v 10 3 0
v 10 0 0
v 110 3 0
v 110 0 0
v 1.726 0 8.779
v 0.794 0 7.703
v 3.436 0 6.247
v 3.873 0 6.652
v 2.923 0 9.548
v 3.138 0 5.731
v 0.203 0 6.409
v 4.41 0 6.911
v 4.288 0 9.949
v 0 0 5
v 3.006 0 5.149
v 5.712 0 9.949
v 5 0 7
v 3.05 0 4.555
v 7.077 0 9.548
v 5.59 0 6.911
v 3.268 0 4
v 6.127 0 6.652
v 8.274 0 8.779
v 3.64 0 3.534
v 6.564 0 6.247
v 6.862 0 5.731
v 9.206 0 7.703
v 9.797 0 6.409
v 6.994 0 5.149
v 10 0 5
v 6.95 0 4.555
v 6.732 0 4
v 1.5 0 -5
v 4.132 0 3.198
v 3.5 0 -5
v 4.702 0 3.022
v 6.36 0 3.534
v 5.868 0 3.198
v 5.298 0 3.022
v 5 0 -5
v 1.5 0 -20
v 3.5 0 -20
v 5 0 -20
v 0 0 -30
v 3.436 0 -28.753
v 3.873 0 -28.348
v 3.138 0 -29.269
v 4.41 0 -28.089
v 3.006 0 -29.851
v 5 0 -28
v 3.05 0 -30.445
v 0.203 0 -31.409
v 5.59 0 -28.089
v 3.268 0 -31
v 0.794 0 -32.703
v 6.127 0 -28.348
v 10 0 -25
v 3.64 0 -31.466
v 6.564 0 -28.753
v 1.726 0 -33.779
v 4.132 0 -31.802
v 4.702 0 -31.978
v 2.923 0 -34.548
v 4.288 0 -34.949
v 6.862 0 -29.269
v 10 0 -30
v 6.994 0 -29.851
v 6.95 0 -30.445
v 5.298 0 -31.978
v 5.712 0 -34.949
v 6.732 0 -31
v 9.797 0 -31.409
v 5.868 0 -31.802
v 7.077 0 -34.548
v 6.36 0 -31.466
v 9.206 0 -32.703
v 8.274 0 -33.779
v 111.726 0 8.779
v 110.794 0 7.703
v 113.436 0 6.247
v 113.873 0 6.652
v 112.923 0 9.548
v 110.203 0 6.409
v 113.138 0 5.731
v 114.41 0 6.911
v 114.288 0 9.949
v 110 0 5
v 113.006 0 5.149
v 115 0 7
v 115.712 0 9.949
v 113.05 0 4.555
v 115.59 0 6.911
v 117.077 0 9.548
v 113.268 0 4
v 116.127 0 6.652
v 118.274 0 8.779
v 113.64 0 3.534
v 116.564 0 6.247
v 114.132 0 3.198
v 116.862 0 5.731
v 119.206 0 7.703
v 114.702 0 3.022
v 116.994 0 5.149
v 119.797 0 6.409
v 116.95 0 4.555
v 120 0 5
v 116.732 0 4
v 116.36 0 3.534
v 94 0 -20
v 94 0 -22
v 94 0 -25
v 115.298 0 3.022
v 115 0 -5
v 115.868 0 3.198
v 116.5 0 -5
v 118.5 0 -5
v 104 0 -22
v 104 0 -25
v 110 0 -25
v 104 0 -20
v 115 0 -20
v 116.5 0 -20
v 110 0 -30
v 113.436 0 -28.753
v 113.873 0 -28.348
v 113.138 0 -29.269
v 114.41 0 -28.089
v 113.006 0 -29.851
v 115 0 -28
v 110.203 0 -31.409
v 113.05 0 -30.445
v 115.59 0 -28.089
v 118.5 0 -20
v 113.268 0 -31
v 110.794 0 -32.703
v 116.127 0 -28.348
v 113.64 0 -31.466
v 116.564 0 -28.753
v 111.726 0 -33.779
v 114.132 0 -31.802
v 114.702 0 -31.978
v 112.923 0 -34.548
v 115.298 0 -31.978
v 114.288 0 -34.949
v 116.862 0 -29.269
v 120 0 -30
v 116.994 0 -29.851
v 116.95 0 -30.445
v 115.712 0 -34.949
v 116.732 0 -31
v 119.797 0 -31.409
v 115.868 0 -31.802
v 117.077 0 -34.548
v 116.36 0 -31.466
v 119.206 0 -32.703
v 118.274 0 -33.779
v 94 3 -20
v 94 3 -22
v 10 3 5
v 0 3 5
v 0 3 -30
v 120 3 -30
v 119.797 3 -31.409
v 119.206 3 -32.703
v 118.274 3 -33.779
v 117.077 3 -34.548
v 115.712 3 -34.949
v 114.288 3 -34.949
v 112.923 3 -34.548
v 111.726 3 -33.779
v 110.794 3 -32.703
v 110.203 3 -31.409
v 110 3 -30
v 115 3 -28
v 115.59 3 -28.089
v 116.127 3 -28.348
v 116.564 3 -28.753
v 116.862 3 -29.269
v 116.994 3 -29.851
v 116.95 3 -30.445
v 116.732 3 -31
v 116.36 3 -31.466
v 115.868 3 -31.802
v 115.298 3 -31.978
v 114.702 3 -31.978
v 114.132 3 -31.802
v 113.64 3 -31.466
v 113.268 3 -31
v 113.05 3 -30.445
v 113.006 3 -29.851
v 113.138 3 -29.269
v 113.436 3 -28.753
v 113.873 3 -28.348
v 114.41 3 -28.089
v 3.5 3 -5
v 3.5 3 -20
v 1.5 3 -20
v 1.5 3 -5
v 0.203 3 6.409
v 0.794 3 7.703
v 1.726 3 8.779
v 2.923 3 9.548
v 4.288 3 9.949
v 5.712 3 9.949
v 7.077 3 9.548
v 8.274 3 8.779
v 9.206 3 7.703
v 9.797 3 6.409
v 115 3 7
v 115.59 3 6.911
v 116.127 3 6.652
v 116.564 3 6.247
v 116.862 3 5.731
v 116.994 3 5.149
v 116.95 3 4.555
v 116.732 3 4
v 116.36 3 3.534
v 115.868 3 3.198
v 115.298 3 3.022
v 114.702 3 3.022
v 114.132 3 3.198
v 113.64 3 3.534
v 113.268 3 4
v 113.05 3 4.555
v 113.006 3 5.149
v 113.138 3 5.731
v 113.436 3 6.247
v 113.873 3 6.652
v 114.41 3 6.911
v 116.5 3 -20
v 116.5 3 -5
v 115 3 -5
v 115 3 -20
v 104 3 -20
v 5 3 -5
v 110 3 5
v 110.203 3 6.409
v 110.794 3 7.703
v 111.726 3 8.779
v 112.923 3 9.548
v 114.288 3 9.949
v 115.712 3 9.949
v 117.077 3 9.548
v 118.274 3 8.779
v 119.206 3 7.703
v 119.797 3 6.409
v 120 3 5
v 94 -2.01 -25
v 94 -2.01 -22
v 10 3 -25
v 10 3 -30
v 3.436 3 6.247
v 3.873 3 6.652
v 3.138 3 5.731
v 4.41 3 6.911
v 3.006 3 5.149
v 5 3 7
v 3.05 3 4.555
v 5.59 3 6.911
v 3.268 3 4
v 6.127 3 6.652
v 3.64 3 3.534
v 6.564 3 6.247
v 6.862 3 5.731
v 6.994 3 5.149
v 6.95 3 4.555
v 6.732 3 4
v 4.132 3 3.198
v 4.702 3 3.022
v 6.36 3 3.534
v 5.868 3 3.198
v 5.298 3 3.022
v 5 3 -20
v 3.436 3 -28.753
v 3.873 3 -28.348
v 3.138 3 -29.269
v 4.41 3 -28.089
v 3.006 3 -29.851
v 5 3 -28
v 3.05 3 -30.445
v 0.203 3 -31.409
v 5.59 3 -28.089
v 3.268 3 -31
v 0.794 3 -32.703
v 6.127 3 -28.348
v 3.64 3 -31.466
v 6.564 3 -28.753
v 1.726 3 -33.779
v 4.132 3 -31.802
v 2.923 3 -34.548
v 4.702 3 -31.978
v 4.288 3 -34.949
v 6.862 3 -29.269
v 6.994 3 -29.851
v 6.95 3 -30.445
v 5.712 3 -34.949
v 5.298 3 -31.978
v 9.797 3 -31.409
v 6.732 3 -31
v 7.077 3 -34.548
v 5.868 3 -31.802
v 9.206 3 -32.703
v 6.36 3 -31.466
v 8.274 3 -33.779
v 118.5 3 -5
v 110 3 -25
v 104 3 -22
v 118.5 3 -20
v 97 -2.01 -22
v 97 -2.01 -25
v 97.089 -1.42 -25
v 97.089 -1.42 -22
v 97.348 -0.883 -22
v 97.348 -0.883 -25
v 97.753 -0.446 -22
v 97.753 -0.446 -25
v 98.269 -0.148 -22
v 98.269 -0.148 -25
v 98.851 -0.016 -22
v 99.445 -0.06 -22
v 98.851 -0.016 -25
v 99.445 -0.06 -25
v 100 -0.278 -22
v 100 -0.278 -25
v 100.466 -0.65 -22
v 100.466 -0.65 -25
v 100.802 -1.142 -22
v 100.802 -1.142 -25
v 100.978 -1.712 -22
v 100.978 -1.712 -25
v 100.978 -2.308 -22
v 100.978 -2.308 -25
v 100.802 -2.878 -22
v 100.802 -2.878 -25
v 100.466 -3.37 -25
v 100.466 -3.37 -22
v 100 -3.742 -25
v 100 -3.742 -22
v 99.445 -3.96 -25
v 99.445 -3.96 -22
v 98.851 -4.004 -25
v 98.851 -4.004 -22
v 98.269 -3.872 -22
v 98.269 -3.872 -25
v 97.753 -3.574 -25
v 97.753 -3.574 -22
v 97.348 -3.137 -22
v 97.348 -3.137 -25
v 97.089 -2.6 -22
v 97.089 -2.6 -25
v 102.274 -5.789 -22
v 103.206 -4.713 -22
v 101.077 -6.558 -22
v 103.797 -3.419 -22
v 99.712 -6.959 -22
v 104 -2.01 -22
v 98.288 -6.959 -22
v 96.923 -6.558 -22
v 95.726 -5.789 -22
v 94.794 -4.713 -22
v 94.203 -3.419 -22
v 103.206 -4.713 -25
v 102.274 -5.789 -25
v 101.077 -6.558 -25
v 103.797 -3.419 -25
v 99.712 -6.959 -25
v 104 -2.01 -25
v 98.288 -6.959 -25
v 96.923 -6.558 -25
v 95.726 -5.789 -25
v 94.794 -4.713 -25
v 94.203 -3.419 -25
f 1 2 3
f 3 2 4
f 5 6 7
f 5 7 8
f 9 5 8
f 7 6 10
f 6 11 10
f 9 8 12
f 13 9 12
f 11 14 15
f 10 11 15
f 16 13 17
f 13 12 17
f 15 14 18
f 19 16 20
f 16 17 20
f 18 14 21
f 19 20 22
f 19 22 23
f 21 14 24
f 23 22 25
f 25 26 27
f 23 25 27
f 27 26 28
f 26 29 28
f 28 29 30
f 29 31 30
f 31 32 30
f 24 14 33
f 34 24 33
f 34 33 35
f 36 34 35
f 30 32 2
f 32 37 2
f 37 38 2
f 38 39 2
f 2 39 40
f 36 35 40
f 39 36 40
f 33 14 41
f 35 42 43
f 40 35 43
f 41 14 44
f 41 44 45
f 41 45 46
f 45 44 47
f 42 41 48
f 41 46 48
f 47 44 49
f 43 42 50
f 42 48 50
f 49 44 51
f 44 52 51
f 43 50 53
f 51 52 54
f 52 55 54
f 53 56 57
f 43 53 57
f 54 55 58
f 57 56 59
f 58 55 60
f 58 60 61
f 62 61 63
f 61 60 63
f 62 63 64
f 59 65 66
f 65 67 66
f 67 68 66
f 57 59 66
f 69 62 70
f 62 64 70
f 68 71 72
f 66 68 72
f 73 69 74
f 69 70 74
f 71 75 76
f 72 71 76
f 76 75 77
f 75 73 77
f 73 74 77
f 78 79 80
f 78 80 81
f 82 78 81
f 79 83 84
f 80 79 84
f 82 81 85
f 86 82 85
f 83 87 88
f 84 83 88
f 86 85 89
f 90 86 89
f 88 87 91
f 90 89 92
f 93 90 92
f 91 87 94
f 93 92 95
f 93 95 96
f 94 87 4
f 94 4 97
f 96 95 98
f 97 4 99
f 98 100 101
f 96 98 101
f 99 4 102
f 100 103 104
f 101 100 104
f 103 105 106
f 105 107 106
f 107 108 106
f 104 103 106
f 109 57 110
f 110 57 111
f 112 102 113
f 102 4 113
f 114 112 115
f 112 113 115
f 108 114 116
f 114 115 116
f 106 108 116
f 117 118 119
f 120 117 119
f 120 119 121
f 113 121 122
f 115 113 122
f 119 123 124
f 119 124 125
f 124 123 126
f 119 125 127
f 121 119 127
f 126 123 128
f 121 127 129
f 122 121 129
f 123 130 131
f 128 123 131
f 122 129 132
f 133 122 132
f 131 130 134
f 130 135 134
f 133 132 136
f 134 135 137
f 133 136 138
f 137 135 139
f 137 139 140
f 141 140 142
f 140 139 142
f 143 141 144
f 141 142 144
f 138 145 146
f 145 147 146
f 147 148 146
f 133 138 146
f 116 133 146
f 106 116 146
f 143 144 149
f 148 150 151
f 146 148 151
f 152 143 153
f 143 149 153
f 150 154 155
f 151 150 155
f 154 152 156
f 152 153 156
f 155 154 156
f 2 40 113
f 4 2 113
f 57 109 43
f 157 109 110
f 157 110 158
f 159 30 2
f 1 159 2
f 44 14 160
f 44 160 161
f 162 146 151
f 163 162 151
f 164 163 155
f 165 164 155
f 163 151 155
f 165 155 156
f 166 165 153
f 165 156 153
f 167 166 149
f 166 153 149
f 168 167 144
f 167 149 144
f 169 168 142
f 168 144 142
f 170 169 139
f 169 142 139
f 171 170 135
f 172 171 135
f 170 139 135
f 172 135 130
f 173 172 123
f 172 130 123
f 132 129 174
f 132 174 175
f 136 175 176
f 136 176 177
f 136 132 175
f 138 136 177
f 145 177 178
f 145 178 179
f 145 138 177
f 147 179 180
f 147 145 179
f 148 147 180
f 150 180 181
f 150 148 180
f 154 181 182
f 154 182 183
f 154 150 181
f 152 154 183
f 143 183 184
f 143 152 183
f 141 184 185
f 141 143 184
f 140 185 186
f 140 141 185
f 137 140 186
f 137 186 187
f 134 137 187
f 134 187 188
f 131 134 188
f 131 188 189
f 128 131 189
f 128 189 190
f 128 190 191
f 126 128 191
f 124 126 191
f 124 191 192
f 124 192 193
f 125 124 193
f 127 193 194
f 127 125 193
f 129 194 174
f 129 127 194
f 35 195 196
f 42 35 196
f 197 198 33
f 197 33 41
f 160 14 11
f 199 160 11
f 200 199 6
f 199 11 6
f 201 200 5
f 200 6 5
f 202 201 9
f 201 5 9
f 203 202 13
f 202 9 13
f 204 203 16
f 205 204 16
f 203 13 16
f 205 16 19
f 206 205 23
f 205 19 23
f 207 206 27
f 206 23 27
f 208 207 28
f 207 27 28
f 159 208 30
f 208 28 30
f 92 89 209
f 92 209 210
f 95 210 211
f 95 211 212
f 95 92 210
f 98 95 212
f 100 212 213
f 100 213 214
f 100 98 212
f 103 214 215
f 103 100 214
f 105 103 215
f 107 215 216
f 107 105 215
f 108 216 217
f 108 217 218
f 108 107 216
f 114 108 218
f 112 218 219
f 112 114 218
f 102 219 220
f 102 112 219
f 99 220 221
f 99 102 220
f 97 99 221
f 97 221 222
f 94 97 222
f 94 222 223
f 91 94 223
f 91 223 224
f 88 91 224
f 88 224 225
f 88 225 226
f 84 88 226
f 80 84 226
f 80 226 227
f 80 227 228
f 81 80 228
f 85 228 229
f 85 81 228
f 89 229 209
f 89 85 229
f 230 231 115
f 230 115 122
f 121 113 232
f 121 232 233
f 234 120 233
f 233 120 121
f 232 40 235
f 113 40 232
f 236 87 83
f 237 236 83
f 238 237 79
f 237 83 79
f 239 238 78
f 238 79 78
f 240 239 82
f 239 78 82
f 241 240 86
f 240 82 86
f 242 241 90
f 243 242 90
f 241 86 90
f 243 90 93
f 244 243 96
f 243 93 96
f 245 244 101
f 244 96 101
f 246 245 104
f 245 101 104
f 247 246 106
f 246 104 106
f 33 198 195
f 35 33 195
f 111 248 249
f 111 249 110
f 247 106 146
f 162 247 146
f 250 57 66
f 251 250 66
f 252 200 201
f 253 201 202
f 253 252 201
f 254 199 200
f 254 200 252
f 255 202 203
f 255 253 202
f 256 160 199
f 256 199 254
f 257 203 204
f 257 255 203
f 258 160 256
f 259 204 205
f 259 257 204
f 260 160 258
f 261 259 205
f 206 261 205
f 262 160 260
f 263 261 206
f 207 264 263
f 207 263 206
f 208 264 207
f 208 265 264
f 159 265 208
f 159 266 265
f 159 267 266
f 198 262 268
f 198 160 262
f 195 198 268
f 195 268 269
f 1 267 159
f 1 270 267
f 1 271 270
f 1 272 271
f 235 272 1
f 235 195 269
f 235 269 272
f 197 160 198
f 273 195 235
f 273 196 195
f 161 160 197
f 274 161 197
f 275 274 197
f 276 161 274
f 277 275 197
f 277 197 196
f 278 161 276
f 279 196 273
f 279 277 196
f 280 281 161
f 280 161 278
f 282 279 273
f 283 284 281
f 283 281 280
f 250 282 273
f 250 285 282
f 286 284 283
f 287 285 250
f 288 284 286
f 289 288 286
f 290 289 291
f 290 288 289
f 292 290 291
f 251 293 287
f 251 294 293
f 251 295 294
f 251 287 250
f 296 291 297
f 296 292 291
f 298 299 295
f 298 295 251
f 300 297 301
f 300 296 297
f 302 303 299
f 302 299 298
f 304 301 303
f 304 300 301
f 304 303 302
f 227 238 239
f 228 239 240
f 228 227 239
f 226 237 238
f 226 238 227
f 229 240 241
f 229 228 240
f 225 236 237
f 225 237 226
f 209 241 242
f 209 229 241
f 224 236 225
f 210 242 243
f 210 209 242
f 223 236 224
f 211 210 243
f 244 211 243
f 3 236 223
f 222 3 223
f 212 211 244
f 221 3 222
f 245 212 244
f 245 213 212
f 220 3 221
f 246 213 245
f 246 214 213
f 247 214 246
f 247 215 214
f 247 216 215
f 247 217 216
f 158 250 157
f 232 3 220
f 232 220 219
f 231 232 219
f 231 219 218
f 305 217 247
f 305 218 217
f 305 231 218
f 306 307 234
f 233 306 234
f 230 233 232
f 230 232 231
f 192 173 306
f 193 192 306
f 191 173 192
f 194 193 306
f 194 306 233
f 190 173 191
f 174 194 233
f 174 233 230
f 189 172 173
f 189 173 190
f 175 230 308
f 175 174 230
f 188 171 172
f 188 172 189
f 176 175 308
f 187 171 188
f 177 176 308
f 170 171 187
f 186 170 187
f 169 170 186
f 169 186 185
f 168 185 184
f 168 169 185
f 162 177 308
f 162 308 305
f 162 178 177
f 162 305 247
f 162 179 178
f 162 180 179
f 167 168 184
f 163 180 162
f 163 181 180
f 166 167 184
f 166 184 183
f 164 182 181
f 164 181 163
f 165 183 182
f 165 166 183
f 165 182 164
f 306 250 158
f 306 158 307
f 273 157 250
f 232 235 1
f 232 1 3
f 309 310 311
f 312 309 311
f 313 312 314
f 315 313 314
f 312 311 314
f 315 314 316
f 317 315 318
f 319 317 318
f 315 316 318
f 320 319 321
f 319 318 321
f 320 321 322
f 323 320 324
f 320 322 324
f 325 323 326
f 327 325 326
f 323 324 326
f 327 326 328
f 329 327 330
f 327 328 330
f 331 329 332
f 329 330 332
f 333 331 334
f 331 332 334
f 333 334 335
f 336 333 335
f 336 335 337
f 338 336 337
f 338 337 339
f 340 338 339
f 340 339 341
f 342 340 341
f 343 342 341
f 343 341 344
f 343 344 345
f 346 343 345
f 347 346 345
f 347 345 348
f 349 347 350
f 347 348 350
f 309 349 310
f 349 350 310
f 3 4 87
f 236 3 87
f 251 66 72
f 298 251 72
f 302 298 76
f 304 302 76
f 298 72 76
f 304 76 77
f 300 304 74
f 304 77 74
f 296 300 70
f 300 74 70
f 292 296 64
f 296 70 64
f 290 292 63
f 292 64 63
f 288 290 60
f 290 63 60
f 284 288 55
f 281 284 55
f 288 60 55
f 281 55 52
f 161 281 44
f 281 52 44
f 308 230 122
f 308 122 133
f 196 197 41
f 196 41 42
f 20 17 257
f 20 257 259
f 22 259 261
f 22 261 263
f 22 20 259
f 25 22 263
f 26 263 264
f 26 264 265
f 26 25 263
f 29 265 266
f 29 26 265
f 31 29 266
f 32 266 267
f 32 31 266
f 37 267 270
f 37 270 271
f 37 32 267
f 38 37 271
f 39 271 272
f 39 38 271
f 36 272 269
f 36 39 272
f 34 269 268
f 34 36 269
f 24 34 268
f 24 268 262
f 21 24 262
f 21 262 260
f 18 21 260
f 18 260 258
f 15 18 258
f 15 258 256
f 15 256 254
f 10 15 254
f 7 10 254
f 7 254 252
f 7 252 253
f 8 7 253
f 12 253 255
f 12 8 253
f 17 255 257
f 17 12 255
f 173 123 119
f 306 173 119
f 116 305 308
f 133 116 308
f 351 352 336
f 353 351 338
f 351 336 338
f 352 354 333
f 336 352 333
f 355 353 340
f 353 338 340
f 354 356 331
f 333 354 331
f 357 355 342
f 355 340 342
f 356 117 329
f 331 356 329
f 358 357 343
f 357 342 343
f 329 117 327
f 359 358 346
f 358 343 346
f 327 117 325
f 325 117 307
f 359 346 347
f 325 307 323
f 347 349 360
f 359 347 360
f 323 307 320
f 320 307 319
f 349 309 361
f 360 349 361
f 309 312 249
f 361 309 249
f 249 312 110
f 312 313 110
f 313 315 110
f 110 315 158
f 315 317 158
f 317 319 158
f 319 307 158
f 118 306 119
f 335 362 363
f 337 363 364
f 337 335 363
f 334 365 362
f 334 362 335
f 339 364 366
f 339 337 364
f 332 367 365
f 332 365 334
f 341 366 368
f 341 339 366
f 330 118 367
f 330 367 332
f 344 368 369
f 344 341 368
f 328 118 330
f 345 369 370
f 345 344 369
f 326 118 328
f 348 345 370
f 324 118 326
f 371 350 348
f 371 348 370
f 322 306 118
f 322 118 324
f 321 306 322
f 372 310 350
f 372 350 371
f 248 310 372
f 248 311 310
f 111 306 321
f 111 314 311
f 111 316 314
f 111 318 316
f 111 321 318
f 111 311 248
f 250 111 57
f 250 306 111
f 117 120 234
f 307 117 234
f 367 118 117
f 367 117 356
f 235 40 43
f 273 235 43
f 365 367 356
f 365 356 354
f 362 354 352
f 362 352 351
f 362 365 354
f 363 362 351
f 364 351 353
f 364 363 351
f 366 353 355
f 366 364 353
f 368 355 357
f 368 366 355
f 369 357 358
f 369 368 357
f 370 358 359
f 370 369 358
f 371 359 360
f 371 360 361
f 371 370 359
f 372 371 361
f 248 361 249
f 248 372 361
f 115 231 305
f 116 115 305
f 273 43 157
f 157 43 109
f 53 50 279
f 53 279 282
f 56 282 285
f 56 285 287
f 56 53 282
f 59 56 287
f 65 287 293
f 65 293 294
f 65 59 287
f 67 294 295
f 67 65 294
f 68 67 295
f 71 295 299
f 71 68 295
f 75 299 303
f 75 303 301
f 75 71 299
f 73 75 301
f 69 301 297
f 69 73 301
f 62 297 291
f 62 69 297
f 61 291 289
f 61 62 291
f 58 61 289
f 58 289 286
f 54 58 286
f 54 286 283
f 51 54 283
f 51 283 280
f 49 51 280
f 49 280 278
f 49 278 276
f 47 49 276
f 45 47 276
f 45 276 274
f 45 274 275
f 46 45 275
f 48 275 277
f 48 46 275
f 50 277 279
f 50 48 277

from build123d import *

# Parameters (mm, degrees)
SKETCH1_R           = 5
SKETCH1_R_2         = 2
SKETCH1_W           = 120
SKETCH1_H           = 25
SKETCH1_W_2         = 110
SKETCH1_H_2         = 15
BOSS_EXTRUDE1_DEPTH = 3
SKETCH2_W           = 2
SKETCH2_H           = 15
CUT_EXTRUDE1_DEPTH  = 3
SKETCH3_R           = 2
BOSS_EXTRUDE3_DEPTH = 3
SKETCH4_W           = 10
SKETCH4_H           = 3
CUT_EXTRUDE2_DEPTH  = 2


with BuildPart() as part:
    # Sketch1 → Boss-Extrude1 (new body)
    # profile 1 of 13: a face of its own
    with BuildSketch(Plane(origin=(0, 0, 0), x_dir=(1, 0, 0), z_dir=(0, 1, 0))):
        with Locations((5, 30)):
            Circle(SKETCH1_R)
        with Locations(Location((5, 30, 0), (0, 0, 270))):
            Circle(SKETCH1_R_2, mode=Mode.SUBTRACT)
    # profile 2 of 13: a face of its own
    with BuildSketch(Plane(origin=(0, 0, 0), x_dir=(1, 0, 0), z_dir=(0, 1, 0))):
        with BuildLine():
            Line((0, 30), (0, 25))
            Line((0, 25), (5, 25))
            ThreePointArc((5, 25), (1.464466094, 26.464466094), (0, 30))
        make_face()
    # profile 3 of 13: a face of its own
    with BuildSketch(Plane(origin=(0, 0, 0), x_dir=(1, 0, 0), z_dir=(0, 1, 0))):
        with BuildLine():
            ThreePointArc((10, 30), (8.535533906, 26.464466094), (5, 25))
            Line((5, 25), (10, 25))
            Line((10, 25), (10, 30))
        make_face()
    # profile 4 of 13: a face of its own
    with BuildSketch(Plane(origin=(0, 0, 0), x_dir=(1, 0, 0), z_dir=(0, 1, 0))):
        with Locations((60, 12.5)):
            Rectangle(SKETCH1_W, SKETCH1_H)
        with Locations((60, 12.5)):
            Rectangle(SKETCH1_W_2, SKETCH1_H_2, mode=Mode.SUBTRACT)
    # profile 5 of 13: a face of its own
    with BuildSketch(Plane(origin=(0, 0, 0), x_dir=(1, 0, 0), z_dir=(0, 1, 0))):
        with BuildLine():
            Line((5, 0), (0, 0))
            Line((0, 0), (0, -5))
            ThreePointArc((0, -5), (1.464466094, -1.464466094), (5, 0))
        make_face()
    # profile 6 of 13: a face of its own
    with BuildSketch(Plane(origin=(0, 0, 0), x_dir=(1, 0, 0), z_dir=(0, 1, 0))):
        with BuildLine():
            Line((10, 0), (5, 0))
            ThreePointArc((5, 0), (8.535533906, -1.464466094), (10, -5))
            Line((10, -5), (10, 0))
        make_face()
    # profile 7 of 13: a face of its own
    with BuildSketch(Plane(origin=(0, 0, 0), x_dir=(1, 0, 0), z_dir=(0, 1, 0))):
        with Locations((5, -5)):
            Circle(SKETCH1_R)
        with Locations(Location((5, -5, 0), (0, 0, 270))):
            Circle(SKETCH1_R_2, mode=Mode.SUBTRACT)
    # profile 8 of 13: a face of its own
    with BuildSketch(Plane(origin=(0, 0, 0), x_dir=(1, 0, 0), z_dir=(0, 1, 0))):
        with BuildLine():
            Line((110, 30), (110, 25))
            Line((110, 25), (115, 25))
            ThreePointArc((115, 25), (111.464466094, 26.464466094), (110, 30))
        make_face()
    # profile 9 of 13: a face of its own
    with BuildSketch(Plane(origin=(0, 0, 0), x_dir=(1, 0, 0), z_dir=(0, 1, 0))):
        with Locations((115, 30)):
            Circle(SKETCH1_R)
        with Locations(Location((115, 30, 0), (0, 0, 270))):
            Circle(SKETCH1_R_2, mode=Mode.SUBTRACT)
    # profile 10 of 13: a face of its own
    with BuildSketch(Plane(origin=(0, 0, 0), x_dir=(1, 0, 0), z_dir=(0, 1, 0))):
        with BuildLine():
            ThreePointArc((120, 30), (118.535533906, 26.464466094), (115, 25))
            Line((115, 25), (120, 25))
            Line((120, 25), (120, 30))
        make_face()
    # profile 11 of 13: a face of its own
    with BuildSketch(Plane(origin=(0, 0, 0), x_dir=(1, 0, 0), z_dir=(0, 1, 0))):
        with BuildLine():
            Line((115, 0), (110, 0))
            Line((110, 0), (110, -5))
            ThreePointArc((110, -5), (111.464466094, -1.464466094), (115, 0))
        make_face()
    # profile 12 of 13: a face of its own
    with BuildSketch(Plane(origin=(0, 0, 0), x_dir=(1, 0, 0), z_dir=(0, 1, 0))):
        with BuildLine():
            Line((120, 0), (115, 0))
            ThreePointArc((115, 0), (118.535533906, -1.464466094), (120, -5))
            Line((120, -5), (120, 0))
        make_face()
    # profile 13 of 13: a face of its own
    with BuildSketch(Plane(origin=(0, 0, 0), x_dir=(1, 0, 0), z_dir=(0, 1, 0))):
        with Locations((115, -5)):
            Circle(SKETCH1_R)
        with Locations(Location((115, -5, 0), (0, 0, 270))):
            Circle(SKETCH1_R_2, mode=Mode.SUBTRACT)
    extrude(amount=BOSS_EXTRUDE1_DEPTH)

    # Sketch2 → Cut-Extrude1 (cut)
    with BuildSketch(Plane(origin=(0, 3, 0), x_dir=(1, 0, 0), z_dir=(0, 1, 0))):
        with Locations((117.5, 12.5)):
            Rectangle(SKETCH2_W, SKETCH2_H)
        with Locations((2.5, 12.5)):
            Rectangle(SKETCH2_W, SKETCH2_H)
    extrude(amount=-CUT_EXTRUDE1_DEPTH, mode=Mode.SUBTRACT)

    # Sketch3 → Boss-Extrude3 (add)
    # profile 1 of 3: a face of its own
    with BuildSketch(Plane(origin=(0, 0, -25), x_dir=(-1, 0, 0), z_dir=(0, 0, -1))):
        with BuildLine():
            ThreePointArc((-103.578198336, 0), (-103.893413516, -0.98310947), (-104, -2.01))
            ThreePointArc((-104, -2.01), (-99, -7.01), (-94, -2.01))
            ThreePointArc((-94, -2.01), (-94.106586484, -0.98310947), (-94.421801664, 0))
            Line((-94.421801664, 0), (-103.578198336, 0))
        make_face()
        with Locations((-99, -2.01)):
            Circle(SKETCH3_R, mode=Mode.SUBTRACT)
    # profile 2 of 3: a face of its own
    with BuildSketch(Plane(origin=(0, 0, -25), x_dir=(-1, 0, 0), z_dir=(0, 0, -1))):
        with BuildLine():
            ThreePointArc((-94.421801664, 0), (-94.106586484, -0.98310947), (-94, -2.01))
            Line((-94, -2.01), (-94, 0))
            Line((-94, 0), (-94.421801664, 0))
        make_face()
    # profile 3 of 3: a face of its own
    with BuildSketch(Plane(origin=(0, 0, -25), x_dir=(-1, 0, 0), z_dir=(0, 0, -1))):
        with BuildLine():
            Line((-104, 0), (-104, -2.01))
            ThreePointArc((-104, -2.01), (-103.893413516, -0.98310947), (-103.578198336, 0))
            Line((-103.578198336, 0), (-104, 0))
        make_face()
    extrude(amount=-BOSS_EXTRUDE3_DEPTH)

    # Sketch4 → Cut-Extrude2 (cut)
    with BuildSketch(Plane.XY.offset(-20)):
        with Locations((99, 1.5)):
            Rectangle(SKETCH4_W, SKETCH4_H)
    extrude(amount=-CUT_EXTRUDE2_DEPTH, mode=Mode.SUBTRACT)


solid = part.part
